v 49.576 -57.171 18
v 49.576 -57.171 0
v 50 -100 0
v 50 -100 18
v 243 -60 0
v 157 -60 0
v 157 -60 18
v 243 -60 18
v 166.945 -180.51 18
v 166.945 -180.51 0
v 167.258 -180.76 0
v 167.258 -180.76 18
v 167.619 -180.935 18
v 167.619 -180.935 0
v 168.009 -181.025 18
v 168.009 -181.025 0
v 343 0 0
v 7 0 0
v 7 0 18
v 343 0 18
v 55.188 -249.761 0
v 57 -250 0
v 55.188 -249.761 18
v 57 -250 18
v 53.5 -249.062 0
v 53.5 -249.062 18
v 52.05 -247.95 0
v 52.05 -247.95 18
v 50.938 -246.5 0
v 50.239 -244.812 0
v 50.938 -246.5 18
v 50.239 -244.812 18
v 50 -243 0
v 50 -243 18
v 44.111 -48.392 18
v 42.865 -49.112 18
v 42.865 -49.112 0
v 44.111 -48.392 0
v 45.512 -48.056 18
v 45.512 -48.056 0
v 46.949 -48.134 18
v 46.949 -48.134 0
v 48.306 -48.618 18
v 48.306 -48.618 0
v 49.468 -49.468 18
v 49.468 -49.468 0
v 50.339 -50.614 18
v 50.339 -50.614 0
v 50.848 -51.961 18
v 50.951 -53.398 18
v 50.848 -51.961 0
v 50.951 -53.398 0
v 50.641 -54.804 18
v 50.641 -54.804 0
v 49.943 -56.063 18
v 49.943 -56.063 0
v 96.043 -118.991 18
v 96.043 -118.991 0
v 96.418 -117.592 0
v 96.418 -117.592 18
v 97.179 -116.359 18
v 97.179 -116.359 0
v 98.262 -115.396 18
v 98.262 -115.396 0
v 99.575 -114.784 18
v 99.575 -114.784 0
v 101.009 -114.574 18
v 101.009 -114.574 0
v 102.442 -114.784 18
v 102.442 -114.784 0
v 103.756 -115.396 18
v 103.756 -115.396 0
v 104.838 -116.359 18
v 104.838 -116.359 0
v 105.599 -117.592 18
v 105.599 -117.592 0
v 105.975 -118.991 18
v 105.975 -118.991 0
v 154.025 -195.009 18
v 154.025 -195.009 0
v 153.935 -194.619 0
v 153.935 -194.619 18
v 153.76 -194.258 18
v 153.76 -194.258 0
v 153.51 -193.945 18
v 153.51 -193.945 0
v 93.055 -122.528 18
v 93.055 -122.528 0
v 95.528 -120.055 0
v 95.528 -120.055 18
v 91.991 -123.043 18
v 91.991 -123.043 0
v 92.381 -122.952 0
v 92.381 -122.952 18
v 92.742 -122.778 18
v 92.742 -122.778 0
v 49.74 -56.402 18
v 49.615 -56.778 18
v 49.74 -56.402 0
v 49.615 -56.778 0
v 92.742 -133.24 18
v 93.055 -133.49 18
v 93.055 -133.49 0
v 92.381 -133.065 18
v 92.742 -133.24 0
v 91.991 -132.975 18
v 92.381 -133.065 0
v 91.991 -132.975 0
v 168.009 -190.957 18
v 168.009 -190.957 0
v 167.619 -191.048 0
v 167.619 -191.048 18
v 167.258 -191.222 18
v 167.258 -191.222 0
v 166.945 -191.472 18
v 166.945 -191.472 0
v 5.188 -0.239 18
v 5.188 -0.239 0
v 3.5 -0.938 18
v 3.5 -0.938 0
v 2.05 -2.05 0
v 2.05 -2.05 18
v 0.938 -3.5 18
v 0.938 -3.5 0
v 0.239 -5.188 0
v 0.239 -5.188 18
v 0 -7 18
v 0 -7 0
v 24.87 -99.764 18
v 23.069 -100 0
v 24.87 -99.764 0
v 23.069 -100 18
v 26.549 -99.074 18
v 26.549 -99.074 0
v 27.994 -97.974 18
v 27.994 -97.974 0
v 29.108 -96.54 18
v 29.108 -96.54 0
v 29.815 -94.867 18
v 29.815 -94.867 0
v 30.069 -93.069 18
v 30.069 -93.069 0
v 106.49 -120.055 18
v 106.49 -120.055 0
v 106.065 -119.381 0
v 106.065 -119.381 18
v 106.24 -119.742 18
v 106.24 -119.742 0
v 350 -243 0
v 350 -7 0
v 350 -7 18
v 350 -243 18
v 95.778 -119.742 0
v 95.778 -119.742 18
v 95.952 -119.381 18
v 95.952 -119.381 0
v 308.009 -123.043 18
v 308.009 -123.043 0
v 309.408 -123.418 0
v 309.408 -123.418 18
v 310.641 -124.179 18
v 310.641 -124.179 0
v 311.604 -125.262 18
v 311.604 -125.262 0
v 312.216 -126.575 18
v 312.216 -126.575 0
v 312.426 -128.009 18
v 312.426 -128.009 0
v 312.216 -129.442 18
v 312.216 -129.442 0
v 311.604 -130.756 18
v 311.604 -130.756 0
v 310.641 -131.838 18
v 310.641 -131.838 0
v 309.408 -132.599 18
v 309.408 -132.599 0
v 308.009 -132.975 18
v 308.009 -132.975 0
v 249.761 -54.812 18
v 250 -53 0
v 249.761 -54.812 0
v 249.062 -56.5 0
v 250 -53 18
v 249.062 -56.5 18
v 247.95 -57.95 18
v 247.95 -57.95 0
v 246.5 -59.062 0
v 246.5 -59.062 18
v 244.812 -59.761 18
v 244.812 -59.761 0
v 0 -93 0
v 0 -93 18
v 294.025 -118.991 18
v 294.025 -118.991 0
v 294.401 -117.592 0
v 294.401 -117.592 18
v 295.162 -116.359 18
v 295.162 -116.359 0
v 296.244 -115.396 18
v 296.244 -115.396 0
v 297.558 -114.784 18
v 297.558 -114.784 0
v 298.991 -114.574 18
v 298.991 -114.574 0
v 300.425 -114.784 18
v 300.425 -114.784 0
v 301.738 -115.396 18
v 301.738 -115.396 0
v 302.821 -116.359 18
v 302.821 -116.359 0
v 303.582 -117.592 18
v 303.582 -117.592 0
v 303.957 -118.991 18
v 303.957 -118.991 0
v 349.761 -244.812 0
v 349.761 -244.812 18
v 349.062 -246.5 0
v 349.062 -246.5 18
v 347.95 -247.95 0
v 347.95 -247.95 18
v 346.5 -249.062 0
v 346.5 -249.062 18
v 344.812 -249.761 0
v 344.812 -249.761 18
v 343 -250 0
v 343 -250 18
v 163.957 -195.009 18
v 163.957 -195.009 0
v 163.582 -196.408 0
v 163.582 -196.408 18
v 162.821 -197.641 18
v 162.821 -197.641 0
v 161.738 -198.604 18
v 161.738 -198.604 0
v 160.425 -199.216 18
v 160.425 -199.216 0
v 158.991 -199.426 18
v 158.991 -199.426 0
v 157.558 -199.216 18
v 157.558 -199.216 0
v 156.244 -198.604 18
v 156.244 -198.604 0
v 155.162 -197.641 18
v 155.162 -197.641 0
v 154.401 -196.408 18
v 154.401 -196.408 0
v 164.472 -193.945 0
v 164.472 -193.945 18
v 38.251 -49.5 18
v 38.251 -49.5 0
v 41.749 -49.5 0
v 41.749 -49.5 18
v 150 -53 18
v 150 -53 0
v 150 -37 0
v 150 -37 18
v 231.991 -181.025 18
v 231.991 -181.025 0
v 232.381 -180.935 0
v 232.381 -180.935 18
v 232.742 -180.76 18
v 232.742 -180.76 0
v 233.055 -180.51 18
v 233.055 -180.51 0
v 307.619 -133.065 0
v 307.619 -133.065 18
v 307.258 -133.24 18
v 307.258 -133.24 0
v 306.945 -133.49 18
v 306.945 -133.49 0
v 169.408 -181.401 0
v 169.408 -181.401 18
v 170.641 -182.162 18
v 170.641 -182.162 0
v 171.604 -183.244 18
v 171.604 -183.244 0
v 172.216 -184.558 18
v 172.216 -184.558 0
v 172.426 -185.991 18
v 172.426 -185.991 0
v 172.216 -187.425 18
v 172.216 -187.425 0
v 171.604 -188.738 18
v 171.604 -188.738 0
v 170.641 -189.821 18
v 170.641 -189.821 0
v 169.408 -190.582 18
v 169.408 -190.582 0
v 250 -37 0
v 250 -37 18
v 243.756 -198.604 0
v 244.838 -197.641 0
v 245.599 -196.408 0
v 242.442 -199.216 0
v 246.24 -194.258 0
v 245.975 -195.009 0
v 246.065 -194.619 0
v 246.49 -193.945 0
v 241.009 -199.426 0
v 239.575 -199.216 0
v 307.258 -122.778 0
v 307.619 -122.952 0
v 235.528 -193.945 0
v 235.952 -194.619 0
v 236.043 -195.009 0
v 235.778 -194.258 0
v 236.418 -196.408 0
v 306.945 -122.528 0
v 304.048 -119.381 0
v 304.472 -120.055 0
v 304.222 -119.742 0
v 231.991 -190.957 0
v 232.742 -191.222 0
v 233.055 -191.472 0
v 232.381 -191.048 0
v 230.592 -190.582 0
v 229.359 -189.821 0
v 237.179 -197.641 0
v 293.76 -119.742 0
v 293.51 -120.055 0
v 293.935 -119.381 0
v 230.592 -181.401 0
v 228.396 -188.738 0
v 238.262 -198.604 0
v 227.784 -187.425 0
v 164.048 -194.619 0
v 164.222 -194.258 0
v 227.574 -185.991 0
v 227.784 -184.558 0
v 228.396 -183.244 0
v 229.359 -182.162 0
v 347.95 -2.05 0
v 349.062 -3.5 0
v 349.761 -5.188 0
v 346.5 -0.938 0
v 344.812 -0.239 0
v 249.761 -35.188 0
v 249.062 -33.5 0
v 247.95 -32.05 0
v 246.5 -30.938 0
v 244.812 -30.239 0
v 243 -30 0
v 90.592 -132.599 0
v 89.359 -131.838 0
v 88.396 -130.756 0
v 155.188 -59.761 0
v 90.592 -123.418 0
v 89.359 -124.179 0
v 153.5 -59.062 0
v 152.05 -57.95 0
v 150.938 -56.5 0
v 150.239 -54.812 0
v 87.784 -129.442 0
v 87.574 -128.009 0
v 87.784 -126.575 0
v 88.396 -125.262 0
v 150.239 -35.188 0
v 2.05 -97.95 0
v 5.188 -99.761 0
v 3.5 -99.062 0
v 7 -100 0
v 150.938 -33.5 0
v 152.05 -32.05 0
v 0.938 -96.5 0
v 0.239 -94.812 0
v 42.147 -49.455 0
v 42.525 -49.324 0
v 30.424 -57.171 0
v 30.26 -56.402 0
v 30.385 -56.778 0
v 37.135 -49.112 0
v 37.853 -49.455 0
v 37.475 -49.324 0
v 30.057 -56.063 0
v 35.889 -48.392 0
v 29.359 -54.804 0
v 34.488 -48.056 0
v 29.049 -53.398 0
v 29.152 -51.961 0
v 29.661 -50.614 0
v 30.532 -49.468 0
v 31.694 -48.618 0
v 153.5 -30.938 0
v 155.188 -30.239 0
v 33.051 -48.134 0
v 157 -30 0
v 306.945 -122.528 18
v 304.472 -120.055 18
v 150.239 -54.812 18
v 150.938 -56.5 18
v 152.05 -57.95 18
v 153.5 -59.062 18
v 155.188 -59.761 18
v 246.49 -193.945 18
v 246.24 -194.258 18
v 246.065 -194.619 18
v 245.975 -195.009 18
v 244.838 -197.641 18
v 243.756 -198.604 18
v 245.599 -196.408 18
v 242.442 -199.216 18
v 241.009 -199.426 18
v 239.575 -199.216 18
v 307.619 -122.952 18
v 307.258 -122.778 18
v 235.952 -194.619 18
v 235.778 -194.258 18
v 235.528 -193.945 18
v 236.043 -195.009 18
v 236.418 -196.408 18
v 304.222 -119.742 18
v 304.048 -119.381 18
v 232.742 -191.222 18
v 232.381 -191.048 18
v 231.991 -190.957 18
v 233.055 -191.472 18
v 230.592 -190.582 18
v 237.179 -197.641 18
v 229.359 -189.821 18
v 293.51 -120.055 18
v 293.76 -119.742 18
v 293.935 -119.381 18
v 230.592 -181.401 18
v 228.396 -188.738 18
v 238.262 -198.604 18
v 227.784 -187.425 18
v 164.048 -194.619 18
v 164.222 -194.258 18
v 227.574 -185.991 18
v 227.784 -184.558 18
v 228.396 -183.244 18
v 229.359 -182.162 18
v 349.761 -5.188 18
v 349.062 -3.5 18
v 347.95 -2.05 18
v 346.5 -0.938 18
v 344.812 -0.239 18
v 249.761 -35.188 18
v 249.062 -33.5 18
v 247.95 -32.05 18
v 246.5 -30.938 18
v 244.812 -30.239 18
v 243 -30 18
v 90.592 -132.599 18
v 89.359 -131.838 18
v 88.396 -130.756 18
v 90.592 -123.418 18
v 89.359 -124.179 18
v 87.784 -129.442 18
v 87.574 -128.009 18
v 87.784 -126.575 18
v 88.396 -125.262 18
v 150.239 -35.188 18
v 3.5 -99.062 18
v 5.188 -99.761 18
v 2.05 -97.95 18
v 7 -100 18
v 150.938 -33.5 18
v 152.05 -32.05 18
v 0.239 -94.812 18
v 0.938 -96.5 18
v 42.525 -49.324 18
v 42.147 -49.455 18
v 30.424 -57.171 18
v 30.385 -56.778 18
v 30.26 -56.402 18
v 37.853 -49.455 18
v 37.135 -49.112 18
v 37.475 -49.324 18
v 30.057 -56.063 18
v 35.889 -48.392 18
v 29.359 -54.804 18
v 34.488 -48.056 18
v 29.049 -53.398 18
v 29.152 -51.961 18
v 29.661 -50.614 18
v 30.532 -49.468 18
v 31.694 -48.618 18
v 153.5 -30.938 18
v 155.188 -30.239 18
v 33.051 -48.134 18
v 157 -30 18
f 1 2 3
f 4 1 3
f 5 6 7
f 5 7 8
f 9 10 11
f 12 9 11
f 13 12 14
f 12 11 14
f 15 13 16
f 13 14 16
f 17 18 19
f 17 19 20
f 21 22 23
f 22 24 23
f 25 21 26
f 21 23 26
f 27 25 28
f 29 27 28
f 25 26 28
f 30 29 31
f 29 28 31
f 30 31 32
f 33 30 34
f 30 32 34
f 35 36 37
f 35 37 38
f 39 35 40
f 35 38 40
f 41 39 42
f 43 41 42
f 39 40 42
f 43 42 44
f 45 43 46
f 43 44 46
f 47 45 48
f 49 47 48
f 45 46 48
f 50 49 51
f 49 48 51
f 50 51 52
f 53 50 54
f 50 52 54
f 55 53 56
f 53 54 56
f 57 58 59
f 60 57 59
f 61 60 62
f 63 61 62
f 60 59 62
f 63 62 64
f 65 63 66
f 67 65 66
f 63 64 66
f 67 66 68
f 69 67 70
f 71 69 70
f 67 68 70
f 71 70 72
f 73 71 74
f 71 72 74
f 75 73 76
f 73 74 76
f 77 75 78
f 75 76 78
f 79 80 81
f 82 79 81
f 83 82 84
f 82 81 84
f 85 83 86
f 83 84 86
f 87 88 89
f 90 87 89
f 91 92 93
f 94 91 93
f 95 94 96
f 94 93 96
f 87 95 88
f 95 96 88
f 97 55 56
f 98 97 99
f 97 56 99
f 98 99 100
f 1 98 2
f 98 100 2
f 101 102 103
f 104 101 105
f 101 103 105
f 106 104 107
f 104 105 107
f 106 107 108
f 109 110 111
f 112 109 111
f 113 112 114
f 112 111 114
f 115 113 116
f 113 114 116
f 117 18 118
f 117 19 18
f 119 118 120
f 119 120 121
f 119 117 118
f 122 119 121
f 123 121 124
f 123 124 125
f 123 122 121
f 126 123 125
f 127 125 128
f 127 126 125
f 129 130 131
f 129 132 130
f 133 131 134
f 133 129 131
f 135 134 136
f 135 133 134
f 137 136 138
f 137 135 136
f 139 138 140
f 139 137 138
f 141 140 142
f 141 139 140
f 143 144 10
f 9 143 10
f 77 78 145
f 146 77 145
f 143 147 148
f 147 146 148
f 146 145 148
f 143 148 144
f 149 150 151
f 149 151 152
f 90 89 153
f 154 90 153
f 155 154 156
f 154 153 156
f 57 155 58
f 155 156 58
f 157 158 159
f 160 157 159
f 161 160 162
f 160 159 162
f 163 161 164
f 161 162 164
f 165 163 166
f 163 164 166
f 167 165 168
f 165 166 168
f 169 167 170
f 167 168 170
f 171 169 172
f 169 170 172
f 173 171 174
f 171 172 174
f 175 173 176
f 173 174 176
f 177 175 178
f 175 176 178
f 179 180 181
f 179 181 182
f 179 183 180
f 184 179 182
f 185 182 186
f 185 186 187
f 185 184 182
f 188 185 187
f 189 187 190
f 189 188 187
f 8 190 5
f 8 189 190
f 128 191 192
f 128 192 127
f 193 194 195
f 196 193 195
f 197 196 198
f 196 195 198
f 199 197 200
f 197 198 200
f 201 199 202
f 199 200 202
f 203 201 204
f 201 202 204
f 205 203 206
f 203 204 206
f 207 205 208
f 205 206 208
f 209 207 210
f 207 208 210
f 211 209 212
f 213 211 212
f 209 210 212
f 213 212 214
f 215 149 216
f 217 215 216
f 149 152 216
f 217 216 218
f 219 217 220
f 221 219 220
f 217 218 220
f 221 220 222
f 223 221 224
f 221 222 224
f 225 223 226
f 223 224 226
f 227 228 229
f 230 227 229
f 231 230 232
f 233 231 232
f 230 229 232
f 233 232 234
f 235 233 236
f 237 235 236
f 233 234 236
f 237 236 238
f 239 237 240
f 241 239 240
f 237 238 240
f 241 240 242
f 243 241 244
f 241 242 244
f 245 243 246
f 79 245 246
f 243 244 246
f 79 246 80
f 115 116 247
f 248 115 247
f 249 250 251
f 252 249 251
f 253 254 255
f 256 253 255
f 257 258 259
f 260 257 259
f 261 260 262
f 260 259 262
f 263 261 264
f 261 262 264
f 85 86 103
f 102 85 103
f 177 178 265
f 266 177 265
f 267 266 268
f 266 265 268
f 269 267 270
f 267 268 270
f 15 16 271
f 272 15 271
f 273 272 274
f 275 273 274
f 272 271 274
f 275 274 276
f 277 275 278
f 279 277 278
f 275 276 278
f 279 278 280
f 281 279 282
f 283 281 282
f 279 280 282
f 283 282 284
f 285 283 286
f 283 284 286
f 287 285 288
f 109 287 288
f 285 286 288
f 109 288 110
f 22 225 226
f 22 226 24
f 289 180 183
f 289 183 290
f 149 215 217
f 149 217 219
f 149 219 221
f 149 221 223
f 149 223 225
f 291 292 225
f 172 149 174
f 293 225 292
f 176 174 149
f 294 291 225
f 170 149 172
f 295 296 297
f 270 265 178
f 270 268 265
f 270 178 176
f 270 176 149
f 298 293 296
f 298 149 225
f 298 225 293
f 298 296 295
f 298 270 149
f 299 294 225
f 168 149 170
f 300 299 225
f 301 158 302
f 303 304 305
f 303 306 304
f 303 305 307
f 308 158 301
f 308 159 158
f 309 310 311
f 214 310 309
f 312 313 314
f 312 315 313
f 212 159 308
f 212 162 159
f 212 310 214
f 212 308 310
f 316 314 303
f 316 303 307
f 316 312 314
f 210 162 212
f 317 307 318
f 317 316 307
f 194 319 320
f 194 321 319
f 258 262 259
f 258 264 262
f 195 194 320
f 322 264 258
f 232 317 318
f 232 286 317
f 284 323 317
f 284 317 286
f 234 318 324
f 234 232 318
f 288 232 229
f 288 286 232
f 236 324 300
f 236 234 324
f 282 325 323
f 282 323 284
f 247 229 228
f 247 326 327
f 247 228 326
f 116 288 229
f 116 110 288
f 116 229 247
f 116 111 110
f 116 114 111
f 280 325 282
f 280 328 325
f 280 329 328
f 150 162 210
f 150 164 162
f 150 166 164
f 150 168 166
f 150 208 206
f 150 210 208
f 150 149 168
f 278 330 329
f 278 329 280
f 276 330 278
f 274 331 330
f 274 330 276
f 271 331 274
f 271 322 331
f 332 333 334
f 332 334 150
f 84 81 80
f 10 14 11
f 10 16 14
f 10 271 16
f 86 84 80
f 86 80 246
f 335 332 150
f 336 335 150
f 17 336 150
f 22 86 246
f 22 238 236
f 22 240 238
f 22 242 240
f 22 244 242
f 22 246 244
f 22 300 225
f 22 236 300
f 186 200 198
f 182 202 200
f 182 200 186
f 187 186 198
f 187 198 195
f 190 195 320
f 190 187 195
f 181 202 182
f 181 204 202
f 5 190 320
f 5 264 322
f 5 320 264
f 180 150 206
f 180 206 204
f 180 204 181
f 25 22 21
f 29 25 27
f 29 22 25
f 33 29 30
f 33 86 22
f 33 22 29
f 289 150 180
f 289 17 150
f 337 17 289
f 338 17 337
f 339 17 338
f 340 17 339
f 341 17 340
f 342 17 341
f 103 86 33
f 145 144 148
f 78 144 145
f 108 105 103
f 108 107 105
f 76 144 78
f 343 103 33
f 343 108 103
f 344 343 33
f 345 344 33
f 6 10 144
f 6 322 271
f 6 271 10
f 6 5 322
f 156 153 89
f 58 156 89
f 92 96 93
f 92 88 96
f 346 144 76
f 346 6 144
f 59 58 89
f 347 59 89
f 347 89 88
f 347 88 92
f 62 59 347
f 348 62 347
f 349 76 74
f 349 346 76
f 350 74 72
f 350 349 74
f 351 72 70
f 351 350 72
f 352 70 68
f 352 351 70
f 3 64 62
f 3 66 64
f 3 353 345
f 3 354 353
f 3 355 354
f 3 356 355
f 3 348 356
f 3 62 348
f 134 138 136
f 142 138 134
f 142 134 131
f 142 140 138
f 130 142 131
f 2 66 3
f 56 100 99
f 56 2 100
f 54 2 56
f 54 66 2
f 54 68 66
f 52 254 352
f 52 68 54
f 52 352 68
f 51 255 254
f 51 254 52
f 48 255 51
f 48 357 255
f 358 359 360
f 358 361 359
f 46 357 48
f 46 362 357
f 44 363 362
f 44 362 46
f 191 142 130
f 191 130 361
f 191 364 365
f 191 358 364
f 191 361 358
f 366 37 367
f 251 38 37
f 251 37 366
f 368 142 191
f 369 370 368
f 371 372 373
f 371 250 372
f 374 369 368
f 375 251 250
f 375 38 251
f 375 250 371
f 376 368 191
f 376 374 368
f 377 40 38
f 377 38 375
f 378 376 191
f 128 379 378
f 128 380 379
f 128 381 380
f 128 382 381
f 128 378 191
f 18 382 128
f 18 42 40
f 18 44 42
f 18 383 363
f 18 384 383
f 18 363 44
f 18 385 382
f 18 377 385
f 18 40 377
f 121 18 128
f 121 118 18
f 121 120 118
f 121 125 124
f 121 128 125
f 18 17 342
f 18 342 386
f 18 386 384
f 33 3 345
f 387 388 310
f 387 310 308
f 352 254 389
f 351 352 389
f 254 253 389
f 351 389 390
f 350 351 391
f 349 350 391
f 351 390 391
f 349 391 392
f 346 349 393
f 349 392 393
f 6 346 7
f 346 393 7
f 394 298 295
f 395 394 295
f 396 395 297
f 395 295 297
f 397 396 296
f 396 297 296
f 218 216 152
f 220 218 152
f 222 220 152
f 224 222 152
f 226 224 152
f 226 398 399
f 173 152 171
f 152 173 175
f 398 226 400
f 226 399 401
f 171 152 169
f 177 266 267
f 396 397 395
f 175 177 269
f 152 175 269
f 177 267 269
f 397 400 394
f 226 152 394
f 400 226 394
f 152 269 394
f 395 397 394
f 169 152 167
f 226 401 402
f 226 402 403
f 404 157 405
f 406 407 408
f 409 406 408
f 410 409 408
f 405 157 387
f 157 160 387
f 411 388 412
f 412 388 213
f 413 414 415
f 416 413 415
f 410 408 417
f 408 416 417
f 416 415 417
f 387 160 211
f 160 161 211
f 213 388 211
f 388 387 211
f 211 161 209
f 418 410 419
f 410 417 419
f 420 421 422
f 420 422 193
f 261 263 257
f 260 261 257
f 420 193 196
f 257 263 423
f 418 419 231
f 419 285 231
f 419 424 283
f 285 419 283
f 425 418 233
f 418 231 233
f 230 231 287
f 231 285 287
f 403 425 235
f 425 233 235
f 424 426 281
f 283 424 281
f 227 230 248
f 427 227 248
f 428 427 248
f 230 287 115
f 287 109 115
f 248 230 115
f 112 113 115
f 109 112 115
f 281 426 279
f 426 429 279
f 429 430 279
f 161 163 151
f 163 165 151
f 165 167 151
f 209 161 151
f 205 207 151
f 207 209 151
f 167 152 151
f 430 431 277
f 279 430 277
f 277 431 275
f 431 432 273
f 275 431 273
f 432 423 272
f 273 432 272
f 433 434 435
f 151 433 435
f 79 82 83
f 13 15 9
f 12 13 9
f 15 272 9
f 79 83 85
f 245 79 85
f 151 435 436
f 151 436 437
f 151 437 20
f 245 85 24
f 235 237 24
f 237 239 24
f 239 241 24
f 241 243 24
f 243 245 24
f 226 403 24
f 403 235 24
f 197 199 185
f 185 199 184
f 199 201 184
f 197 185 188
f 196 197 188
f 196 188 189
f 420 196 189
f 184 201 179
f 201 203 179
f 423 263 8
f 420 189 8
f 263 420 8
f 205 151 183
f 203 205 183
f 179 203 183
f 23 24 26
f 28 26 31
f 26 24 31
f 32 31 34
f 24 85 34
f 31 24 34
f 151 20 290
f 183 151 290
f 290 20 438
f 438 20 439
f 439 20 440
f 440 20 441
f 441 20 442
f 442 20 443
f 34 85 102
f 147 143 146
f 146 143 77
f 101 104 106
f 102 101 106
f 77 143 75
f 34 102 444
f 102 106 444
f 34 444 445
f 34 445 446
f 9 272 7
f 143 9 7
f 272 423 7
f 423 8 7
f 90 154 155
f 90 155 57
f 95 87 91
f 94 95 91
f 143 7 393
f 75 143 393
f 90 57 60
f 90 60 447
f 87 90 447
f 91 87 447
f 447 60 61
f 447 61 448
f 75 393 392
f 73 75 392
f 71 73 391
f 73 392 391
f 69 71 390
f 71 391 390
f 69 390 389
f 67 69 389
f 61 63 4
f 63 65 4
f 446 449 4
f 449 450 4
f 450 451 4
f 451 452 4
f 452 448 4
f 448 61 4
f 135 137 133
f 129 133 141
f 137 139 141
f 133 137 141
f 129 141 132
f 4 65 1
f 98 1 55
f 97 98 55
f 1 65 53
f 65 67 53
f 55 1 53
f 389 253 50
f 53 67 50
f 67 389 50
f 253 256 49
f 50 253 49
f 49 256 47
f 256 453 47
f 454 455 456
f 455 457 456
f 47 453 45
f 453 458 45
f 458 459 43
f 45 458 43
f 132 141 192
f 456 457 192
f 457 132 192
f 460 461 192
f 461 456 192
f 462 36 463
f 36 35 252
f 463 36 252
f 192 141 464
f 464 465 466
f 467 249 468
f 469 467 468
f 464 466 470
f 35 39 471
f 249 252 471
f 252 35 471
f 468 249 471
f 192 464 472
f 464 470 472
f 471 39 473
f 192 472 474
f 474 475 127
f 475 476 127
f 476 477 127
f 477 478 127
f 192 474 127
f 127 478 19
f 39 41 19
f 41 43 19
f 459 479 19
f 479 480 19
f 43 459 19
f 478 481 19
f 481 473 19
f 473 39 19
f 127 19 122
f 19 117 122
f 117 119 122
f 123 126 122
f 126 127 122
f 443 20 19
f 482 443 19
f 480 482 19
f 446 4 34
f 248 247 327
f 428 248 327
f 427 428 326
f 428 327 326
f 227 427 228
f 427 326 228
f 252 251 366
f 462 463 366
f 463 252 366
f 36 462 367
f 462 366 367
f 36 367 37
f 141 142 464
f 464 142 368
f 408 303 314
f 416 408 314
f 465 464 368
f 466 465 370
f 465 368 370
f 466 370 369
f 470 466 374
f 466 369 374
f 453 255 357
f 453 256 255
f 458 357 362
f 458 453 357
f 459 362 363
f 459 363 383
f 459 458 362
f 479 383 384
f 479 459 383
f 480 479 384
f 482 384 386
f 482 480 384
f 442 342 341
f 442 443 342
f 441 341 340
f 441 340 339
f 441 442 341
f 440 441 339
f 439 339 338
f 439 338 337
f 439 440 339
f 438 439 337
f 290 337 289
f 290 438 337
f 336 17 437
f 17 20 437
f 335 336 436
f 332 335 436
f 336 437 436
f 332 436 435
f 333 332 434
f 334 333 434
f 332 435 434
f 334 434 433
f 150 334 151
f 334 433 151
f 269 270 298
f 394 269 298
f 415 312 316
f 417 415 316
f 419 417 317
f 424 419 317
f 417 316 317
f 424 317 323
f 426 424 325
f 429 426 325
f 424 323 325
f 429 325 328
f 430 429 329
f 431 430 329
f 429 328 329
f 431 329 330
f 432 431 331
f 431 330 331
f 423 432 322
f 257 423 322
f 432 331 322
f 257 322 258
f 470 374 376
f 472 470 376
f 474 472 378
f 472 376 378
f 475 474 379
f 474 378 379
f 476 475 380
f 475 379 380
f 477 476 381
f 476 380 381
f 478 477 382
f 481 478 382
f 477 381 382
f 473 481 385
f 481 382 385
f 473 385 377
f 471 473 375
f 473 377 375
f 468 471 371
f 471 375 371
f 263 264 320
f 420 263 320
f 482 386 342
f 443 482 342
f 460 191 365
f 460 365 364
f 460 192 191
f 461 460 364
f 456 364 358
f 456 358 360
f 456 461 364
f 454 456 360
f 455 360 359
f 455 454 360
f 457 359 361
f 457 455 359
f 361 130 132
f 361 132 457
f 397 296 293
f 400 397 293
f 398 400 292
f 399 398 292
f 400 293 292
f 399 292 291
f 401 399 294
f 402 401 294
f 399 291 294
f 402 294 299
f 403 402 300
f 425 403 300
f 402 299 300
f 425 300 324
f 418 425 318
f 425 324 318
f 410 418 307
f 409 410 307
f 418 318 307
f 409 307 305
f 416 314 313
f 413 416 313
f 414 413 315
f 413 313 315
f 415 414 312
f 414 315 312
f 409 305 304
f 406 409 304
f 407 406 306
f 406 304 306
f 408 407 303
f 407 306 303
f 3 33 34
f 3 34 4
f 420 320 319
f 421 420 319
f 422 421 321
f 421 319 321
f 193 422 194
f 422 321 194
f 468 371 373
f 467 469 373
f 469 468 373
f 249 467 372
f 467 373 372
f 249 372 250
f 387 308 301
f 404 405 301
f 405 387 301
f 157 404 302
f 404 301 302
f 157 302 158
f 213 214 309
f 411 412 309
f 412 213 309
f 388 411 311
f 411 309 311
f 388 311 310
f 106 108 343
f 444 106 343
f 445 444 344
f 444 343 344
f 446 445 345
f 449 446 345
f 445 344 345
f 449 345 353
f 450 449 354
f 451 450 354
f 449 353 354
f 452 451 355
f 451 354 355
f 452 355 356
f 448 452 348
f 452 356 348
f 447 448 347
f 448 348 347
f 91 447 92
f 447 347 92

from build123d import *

# Parameters (mm, degrees)
BOSS_EXTRU_2_DEPTH      = 18
ESQUISSE1_W             = 100
ESQUISSE1_H             = 30
ENL_V_MAT_EXTRU_1_DEPTH = 19
CONG_1_R                = 7


with BuildPart() as part:
    # Esquisse2 → Boss.-Extru.2 (new body)
    with BuildSketch(Plane.XY):
        Polygon((0, 0), (350, 0), (350, -250), (50, -250), (50, -100), (0, -100), align=None)
    extrude(amount=BOSS_EXTRU_2_DEPTH)

    # Esquisse1 → Enlèv. mat.-Extru.1 (cut, through all)
    with BuildSketch(Plane.XY):
        with BuildLine():
            Line((106.489567957, -120.054539114), (166.945460886, -180.510432043))
            ThreePointArc((166.945460886, -180.510432043), (167.433604863, -180.857617354), (168.008646739, -181.025394064))
            ThreePointArc((168.008646739, -181.025394064), (172.426406871, -185.991378029), (168.008646739, -190.957361993))
            ThreePointArc((168.008646739, -190.957361993), (167.433604863, -191.125138703), (166.945460886, -191.472324014))
            Line((166.945460886, -191.472324014), (164.472324014, -193.945460886))
            ThreePointArc((164.472324014, -193.945460886), (164.125138703, -194.433604863), (163.957361993, -195.008646739))
            ThreePointArc((163.957361993, -195.008646739), (158.991378029, -199.426406871), (154.025394064, -195.008646739))
            ThreePointArc((154.025394064, -195.008646739), (153.857617354, -194.433604863), (153.510432043, -193.945460886))
            Line((153.510432043, -193.945460886), (93.054539114, -133.489567957))
            ThreePointArc((93.054539114, -133.489567957), (92.566395137, -133.142382646), (91.991353261, -132.974605936))
            ThreePointArc((91.991353261, -132.974605936), (87.573593129, -128.008621971), (91.991353261, -123.042638007))
            ThreePointArc((91.991353261, -123.042638007), (92.566395137, -122.874861297), (93.054539114, -122.527675986))
            Line((93.054539114, -122.527675986), (95.527675986, -120.054539114))
            ThreePointArc((95.527675986, -120.054539114), (95.874861297, -119.566395137), (96.042638007, -118.991353261))
            ThreePointArc((96.042638007, -118.991353261), (101.008621971, -114.573593129), (105.974605936, -118.991353261))
            ThreePointArc((105.974605936, -118.991353261), (106.142382646, -119.566395137), (106.489567957, -120.054539114))
        make_face()
        with BuildLine():
            Line((50, -100), (30, -100))
            Line((30, -100), (30.424047381, -57.1712145))
            ThreePointArc((30.424047381, -57.1712145), (30.332595572, -56.586679793), (30.056564564, -56.06337191))
            ThreePointArc((30.056564564, -56.06337191), (30.532330845, -49.467962139), (37.135309084, -49.11234721))
            ThreePointArc((37.135309084, -49.11234721), (37.660561143, -49.400327171), (38.251228148, -49.5))
            Line((38.251228148, -49.5), (41.748771852, -49.5))
            ThreePointArc((41.748771852, -49.5), (42.339438857, -49.400327171), (42.864690916, -49.11234721))
            ThreePointArc((42.864690916, -49.11234721), (49.467669155, -49.467962139), (49.943435436, -56.06337191))
            ThreePointArc((49.943435436, -56.06337191), (49.667404428, -56.586679793), (49.575952619, -57.1712145))
            Line((49.575952619, -57.1712145), (50, -100))
        make_face()
        with Locations((200, -45)):
            Rectangle(ESQUISSE1_W, ESQUISSE1_H)
        with BuildLine():
            Line((304.472324014, -120.054539114), (306.945460886, -122.527675986))
            ThreePointArc((306.945460886, -122.527675986), (307.433604863, -122.874861297), (308.008646739, -123.042638007))
            ThreePointArc((308.008646739, -123.042638007), (312.426406871, -128.008621971), (308.008646739, -132.974605936))
            ThreePointArc((308.008646739, -132.974605936), (307.433604863, -133.142382646), (306.945460886, -133.489567957))
            Line((306.945460886, -133.489567957), (246.489567957, -193.945460886))
            ThreePointArc((246.489567957, -193.945460886), (246.142382646, -194.433604863), (245.974605936, -195.008646739))
            ThreePointArc((245.974605936, -195.008646739), (241.008621971, -199.426406871), (236.042638007, -195.008646739))
            ThreePointArc((236.042638007, -195.008646739), (235.874861297, -194.433604863), (235.527675986, -193.945460886))
            Line((235.527675986, -193.945460886), (233.054539114, -191.472324014))
            ThreePointArc((233.054539114, -191.472324014), (232.566395137, -191.125138703), (231.991353261, -190.957361993))
            ThreePointArc((231.991353261, -190.957361993), (227.573593129, -185.991378029), (231.991353261, -181.025394064))
            ThreePointArc((231.991353261, -181.025394064), (232.566395137, -180.857617354), (233.054539114, -180.510432043))
            Line((233.054539114, -180.510432043), (293.510432043, -120.054539114))
            ThreePointArc((293.510432043, -120.054539114), (293.857617354, -119.566395137), (294.025394064, -118.991353261))
            ThreePointArc((294.025394064, -118.991353261), (298.991378029, -114.573593129), (303.957361993, -118.991353261))
            ThreePointArc((303.957361993, -118.991353261), (304.125138703, -119.566395137), (304.472324014, -120.054539114))
        make_face()
    extrude(amount=ENL_V_MAT_EXTRU_1_DEPTH, mode=Mode.SUBTRACT)

    # Congé1
    cong_1_edges = [part.edges().sort_by_distance(p)[0] for p in [
        (0, 0, 9),
        (350, 0, 9),
        (350, -250, 9),
        (50, -250, 9),
        (0, -100, 9),
        (150, -30, 9),
        (150, -60, 9),
        (250, -60, 9),
        (250, -30, 9),
        (30, -100, 9),
    ]]
    fillet(cong_1_edges, radius=CONG_1_R)


solid = part.part
